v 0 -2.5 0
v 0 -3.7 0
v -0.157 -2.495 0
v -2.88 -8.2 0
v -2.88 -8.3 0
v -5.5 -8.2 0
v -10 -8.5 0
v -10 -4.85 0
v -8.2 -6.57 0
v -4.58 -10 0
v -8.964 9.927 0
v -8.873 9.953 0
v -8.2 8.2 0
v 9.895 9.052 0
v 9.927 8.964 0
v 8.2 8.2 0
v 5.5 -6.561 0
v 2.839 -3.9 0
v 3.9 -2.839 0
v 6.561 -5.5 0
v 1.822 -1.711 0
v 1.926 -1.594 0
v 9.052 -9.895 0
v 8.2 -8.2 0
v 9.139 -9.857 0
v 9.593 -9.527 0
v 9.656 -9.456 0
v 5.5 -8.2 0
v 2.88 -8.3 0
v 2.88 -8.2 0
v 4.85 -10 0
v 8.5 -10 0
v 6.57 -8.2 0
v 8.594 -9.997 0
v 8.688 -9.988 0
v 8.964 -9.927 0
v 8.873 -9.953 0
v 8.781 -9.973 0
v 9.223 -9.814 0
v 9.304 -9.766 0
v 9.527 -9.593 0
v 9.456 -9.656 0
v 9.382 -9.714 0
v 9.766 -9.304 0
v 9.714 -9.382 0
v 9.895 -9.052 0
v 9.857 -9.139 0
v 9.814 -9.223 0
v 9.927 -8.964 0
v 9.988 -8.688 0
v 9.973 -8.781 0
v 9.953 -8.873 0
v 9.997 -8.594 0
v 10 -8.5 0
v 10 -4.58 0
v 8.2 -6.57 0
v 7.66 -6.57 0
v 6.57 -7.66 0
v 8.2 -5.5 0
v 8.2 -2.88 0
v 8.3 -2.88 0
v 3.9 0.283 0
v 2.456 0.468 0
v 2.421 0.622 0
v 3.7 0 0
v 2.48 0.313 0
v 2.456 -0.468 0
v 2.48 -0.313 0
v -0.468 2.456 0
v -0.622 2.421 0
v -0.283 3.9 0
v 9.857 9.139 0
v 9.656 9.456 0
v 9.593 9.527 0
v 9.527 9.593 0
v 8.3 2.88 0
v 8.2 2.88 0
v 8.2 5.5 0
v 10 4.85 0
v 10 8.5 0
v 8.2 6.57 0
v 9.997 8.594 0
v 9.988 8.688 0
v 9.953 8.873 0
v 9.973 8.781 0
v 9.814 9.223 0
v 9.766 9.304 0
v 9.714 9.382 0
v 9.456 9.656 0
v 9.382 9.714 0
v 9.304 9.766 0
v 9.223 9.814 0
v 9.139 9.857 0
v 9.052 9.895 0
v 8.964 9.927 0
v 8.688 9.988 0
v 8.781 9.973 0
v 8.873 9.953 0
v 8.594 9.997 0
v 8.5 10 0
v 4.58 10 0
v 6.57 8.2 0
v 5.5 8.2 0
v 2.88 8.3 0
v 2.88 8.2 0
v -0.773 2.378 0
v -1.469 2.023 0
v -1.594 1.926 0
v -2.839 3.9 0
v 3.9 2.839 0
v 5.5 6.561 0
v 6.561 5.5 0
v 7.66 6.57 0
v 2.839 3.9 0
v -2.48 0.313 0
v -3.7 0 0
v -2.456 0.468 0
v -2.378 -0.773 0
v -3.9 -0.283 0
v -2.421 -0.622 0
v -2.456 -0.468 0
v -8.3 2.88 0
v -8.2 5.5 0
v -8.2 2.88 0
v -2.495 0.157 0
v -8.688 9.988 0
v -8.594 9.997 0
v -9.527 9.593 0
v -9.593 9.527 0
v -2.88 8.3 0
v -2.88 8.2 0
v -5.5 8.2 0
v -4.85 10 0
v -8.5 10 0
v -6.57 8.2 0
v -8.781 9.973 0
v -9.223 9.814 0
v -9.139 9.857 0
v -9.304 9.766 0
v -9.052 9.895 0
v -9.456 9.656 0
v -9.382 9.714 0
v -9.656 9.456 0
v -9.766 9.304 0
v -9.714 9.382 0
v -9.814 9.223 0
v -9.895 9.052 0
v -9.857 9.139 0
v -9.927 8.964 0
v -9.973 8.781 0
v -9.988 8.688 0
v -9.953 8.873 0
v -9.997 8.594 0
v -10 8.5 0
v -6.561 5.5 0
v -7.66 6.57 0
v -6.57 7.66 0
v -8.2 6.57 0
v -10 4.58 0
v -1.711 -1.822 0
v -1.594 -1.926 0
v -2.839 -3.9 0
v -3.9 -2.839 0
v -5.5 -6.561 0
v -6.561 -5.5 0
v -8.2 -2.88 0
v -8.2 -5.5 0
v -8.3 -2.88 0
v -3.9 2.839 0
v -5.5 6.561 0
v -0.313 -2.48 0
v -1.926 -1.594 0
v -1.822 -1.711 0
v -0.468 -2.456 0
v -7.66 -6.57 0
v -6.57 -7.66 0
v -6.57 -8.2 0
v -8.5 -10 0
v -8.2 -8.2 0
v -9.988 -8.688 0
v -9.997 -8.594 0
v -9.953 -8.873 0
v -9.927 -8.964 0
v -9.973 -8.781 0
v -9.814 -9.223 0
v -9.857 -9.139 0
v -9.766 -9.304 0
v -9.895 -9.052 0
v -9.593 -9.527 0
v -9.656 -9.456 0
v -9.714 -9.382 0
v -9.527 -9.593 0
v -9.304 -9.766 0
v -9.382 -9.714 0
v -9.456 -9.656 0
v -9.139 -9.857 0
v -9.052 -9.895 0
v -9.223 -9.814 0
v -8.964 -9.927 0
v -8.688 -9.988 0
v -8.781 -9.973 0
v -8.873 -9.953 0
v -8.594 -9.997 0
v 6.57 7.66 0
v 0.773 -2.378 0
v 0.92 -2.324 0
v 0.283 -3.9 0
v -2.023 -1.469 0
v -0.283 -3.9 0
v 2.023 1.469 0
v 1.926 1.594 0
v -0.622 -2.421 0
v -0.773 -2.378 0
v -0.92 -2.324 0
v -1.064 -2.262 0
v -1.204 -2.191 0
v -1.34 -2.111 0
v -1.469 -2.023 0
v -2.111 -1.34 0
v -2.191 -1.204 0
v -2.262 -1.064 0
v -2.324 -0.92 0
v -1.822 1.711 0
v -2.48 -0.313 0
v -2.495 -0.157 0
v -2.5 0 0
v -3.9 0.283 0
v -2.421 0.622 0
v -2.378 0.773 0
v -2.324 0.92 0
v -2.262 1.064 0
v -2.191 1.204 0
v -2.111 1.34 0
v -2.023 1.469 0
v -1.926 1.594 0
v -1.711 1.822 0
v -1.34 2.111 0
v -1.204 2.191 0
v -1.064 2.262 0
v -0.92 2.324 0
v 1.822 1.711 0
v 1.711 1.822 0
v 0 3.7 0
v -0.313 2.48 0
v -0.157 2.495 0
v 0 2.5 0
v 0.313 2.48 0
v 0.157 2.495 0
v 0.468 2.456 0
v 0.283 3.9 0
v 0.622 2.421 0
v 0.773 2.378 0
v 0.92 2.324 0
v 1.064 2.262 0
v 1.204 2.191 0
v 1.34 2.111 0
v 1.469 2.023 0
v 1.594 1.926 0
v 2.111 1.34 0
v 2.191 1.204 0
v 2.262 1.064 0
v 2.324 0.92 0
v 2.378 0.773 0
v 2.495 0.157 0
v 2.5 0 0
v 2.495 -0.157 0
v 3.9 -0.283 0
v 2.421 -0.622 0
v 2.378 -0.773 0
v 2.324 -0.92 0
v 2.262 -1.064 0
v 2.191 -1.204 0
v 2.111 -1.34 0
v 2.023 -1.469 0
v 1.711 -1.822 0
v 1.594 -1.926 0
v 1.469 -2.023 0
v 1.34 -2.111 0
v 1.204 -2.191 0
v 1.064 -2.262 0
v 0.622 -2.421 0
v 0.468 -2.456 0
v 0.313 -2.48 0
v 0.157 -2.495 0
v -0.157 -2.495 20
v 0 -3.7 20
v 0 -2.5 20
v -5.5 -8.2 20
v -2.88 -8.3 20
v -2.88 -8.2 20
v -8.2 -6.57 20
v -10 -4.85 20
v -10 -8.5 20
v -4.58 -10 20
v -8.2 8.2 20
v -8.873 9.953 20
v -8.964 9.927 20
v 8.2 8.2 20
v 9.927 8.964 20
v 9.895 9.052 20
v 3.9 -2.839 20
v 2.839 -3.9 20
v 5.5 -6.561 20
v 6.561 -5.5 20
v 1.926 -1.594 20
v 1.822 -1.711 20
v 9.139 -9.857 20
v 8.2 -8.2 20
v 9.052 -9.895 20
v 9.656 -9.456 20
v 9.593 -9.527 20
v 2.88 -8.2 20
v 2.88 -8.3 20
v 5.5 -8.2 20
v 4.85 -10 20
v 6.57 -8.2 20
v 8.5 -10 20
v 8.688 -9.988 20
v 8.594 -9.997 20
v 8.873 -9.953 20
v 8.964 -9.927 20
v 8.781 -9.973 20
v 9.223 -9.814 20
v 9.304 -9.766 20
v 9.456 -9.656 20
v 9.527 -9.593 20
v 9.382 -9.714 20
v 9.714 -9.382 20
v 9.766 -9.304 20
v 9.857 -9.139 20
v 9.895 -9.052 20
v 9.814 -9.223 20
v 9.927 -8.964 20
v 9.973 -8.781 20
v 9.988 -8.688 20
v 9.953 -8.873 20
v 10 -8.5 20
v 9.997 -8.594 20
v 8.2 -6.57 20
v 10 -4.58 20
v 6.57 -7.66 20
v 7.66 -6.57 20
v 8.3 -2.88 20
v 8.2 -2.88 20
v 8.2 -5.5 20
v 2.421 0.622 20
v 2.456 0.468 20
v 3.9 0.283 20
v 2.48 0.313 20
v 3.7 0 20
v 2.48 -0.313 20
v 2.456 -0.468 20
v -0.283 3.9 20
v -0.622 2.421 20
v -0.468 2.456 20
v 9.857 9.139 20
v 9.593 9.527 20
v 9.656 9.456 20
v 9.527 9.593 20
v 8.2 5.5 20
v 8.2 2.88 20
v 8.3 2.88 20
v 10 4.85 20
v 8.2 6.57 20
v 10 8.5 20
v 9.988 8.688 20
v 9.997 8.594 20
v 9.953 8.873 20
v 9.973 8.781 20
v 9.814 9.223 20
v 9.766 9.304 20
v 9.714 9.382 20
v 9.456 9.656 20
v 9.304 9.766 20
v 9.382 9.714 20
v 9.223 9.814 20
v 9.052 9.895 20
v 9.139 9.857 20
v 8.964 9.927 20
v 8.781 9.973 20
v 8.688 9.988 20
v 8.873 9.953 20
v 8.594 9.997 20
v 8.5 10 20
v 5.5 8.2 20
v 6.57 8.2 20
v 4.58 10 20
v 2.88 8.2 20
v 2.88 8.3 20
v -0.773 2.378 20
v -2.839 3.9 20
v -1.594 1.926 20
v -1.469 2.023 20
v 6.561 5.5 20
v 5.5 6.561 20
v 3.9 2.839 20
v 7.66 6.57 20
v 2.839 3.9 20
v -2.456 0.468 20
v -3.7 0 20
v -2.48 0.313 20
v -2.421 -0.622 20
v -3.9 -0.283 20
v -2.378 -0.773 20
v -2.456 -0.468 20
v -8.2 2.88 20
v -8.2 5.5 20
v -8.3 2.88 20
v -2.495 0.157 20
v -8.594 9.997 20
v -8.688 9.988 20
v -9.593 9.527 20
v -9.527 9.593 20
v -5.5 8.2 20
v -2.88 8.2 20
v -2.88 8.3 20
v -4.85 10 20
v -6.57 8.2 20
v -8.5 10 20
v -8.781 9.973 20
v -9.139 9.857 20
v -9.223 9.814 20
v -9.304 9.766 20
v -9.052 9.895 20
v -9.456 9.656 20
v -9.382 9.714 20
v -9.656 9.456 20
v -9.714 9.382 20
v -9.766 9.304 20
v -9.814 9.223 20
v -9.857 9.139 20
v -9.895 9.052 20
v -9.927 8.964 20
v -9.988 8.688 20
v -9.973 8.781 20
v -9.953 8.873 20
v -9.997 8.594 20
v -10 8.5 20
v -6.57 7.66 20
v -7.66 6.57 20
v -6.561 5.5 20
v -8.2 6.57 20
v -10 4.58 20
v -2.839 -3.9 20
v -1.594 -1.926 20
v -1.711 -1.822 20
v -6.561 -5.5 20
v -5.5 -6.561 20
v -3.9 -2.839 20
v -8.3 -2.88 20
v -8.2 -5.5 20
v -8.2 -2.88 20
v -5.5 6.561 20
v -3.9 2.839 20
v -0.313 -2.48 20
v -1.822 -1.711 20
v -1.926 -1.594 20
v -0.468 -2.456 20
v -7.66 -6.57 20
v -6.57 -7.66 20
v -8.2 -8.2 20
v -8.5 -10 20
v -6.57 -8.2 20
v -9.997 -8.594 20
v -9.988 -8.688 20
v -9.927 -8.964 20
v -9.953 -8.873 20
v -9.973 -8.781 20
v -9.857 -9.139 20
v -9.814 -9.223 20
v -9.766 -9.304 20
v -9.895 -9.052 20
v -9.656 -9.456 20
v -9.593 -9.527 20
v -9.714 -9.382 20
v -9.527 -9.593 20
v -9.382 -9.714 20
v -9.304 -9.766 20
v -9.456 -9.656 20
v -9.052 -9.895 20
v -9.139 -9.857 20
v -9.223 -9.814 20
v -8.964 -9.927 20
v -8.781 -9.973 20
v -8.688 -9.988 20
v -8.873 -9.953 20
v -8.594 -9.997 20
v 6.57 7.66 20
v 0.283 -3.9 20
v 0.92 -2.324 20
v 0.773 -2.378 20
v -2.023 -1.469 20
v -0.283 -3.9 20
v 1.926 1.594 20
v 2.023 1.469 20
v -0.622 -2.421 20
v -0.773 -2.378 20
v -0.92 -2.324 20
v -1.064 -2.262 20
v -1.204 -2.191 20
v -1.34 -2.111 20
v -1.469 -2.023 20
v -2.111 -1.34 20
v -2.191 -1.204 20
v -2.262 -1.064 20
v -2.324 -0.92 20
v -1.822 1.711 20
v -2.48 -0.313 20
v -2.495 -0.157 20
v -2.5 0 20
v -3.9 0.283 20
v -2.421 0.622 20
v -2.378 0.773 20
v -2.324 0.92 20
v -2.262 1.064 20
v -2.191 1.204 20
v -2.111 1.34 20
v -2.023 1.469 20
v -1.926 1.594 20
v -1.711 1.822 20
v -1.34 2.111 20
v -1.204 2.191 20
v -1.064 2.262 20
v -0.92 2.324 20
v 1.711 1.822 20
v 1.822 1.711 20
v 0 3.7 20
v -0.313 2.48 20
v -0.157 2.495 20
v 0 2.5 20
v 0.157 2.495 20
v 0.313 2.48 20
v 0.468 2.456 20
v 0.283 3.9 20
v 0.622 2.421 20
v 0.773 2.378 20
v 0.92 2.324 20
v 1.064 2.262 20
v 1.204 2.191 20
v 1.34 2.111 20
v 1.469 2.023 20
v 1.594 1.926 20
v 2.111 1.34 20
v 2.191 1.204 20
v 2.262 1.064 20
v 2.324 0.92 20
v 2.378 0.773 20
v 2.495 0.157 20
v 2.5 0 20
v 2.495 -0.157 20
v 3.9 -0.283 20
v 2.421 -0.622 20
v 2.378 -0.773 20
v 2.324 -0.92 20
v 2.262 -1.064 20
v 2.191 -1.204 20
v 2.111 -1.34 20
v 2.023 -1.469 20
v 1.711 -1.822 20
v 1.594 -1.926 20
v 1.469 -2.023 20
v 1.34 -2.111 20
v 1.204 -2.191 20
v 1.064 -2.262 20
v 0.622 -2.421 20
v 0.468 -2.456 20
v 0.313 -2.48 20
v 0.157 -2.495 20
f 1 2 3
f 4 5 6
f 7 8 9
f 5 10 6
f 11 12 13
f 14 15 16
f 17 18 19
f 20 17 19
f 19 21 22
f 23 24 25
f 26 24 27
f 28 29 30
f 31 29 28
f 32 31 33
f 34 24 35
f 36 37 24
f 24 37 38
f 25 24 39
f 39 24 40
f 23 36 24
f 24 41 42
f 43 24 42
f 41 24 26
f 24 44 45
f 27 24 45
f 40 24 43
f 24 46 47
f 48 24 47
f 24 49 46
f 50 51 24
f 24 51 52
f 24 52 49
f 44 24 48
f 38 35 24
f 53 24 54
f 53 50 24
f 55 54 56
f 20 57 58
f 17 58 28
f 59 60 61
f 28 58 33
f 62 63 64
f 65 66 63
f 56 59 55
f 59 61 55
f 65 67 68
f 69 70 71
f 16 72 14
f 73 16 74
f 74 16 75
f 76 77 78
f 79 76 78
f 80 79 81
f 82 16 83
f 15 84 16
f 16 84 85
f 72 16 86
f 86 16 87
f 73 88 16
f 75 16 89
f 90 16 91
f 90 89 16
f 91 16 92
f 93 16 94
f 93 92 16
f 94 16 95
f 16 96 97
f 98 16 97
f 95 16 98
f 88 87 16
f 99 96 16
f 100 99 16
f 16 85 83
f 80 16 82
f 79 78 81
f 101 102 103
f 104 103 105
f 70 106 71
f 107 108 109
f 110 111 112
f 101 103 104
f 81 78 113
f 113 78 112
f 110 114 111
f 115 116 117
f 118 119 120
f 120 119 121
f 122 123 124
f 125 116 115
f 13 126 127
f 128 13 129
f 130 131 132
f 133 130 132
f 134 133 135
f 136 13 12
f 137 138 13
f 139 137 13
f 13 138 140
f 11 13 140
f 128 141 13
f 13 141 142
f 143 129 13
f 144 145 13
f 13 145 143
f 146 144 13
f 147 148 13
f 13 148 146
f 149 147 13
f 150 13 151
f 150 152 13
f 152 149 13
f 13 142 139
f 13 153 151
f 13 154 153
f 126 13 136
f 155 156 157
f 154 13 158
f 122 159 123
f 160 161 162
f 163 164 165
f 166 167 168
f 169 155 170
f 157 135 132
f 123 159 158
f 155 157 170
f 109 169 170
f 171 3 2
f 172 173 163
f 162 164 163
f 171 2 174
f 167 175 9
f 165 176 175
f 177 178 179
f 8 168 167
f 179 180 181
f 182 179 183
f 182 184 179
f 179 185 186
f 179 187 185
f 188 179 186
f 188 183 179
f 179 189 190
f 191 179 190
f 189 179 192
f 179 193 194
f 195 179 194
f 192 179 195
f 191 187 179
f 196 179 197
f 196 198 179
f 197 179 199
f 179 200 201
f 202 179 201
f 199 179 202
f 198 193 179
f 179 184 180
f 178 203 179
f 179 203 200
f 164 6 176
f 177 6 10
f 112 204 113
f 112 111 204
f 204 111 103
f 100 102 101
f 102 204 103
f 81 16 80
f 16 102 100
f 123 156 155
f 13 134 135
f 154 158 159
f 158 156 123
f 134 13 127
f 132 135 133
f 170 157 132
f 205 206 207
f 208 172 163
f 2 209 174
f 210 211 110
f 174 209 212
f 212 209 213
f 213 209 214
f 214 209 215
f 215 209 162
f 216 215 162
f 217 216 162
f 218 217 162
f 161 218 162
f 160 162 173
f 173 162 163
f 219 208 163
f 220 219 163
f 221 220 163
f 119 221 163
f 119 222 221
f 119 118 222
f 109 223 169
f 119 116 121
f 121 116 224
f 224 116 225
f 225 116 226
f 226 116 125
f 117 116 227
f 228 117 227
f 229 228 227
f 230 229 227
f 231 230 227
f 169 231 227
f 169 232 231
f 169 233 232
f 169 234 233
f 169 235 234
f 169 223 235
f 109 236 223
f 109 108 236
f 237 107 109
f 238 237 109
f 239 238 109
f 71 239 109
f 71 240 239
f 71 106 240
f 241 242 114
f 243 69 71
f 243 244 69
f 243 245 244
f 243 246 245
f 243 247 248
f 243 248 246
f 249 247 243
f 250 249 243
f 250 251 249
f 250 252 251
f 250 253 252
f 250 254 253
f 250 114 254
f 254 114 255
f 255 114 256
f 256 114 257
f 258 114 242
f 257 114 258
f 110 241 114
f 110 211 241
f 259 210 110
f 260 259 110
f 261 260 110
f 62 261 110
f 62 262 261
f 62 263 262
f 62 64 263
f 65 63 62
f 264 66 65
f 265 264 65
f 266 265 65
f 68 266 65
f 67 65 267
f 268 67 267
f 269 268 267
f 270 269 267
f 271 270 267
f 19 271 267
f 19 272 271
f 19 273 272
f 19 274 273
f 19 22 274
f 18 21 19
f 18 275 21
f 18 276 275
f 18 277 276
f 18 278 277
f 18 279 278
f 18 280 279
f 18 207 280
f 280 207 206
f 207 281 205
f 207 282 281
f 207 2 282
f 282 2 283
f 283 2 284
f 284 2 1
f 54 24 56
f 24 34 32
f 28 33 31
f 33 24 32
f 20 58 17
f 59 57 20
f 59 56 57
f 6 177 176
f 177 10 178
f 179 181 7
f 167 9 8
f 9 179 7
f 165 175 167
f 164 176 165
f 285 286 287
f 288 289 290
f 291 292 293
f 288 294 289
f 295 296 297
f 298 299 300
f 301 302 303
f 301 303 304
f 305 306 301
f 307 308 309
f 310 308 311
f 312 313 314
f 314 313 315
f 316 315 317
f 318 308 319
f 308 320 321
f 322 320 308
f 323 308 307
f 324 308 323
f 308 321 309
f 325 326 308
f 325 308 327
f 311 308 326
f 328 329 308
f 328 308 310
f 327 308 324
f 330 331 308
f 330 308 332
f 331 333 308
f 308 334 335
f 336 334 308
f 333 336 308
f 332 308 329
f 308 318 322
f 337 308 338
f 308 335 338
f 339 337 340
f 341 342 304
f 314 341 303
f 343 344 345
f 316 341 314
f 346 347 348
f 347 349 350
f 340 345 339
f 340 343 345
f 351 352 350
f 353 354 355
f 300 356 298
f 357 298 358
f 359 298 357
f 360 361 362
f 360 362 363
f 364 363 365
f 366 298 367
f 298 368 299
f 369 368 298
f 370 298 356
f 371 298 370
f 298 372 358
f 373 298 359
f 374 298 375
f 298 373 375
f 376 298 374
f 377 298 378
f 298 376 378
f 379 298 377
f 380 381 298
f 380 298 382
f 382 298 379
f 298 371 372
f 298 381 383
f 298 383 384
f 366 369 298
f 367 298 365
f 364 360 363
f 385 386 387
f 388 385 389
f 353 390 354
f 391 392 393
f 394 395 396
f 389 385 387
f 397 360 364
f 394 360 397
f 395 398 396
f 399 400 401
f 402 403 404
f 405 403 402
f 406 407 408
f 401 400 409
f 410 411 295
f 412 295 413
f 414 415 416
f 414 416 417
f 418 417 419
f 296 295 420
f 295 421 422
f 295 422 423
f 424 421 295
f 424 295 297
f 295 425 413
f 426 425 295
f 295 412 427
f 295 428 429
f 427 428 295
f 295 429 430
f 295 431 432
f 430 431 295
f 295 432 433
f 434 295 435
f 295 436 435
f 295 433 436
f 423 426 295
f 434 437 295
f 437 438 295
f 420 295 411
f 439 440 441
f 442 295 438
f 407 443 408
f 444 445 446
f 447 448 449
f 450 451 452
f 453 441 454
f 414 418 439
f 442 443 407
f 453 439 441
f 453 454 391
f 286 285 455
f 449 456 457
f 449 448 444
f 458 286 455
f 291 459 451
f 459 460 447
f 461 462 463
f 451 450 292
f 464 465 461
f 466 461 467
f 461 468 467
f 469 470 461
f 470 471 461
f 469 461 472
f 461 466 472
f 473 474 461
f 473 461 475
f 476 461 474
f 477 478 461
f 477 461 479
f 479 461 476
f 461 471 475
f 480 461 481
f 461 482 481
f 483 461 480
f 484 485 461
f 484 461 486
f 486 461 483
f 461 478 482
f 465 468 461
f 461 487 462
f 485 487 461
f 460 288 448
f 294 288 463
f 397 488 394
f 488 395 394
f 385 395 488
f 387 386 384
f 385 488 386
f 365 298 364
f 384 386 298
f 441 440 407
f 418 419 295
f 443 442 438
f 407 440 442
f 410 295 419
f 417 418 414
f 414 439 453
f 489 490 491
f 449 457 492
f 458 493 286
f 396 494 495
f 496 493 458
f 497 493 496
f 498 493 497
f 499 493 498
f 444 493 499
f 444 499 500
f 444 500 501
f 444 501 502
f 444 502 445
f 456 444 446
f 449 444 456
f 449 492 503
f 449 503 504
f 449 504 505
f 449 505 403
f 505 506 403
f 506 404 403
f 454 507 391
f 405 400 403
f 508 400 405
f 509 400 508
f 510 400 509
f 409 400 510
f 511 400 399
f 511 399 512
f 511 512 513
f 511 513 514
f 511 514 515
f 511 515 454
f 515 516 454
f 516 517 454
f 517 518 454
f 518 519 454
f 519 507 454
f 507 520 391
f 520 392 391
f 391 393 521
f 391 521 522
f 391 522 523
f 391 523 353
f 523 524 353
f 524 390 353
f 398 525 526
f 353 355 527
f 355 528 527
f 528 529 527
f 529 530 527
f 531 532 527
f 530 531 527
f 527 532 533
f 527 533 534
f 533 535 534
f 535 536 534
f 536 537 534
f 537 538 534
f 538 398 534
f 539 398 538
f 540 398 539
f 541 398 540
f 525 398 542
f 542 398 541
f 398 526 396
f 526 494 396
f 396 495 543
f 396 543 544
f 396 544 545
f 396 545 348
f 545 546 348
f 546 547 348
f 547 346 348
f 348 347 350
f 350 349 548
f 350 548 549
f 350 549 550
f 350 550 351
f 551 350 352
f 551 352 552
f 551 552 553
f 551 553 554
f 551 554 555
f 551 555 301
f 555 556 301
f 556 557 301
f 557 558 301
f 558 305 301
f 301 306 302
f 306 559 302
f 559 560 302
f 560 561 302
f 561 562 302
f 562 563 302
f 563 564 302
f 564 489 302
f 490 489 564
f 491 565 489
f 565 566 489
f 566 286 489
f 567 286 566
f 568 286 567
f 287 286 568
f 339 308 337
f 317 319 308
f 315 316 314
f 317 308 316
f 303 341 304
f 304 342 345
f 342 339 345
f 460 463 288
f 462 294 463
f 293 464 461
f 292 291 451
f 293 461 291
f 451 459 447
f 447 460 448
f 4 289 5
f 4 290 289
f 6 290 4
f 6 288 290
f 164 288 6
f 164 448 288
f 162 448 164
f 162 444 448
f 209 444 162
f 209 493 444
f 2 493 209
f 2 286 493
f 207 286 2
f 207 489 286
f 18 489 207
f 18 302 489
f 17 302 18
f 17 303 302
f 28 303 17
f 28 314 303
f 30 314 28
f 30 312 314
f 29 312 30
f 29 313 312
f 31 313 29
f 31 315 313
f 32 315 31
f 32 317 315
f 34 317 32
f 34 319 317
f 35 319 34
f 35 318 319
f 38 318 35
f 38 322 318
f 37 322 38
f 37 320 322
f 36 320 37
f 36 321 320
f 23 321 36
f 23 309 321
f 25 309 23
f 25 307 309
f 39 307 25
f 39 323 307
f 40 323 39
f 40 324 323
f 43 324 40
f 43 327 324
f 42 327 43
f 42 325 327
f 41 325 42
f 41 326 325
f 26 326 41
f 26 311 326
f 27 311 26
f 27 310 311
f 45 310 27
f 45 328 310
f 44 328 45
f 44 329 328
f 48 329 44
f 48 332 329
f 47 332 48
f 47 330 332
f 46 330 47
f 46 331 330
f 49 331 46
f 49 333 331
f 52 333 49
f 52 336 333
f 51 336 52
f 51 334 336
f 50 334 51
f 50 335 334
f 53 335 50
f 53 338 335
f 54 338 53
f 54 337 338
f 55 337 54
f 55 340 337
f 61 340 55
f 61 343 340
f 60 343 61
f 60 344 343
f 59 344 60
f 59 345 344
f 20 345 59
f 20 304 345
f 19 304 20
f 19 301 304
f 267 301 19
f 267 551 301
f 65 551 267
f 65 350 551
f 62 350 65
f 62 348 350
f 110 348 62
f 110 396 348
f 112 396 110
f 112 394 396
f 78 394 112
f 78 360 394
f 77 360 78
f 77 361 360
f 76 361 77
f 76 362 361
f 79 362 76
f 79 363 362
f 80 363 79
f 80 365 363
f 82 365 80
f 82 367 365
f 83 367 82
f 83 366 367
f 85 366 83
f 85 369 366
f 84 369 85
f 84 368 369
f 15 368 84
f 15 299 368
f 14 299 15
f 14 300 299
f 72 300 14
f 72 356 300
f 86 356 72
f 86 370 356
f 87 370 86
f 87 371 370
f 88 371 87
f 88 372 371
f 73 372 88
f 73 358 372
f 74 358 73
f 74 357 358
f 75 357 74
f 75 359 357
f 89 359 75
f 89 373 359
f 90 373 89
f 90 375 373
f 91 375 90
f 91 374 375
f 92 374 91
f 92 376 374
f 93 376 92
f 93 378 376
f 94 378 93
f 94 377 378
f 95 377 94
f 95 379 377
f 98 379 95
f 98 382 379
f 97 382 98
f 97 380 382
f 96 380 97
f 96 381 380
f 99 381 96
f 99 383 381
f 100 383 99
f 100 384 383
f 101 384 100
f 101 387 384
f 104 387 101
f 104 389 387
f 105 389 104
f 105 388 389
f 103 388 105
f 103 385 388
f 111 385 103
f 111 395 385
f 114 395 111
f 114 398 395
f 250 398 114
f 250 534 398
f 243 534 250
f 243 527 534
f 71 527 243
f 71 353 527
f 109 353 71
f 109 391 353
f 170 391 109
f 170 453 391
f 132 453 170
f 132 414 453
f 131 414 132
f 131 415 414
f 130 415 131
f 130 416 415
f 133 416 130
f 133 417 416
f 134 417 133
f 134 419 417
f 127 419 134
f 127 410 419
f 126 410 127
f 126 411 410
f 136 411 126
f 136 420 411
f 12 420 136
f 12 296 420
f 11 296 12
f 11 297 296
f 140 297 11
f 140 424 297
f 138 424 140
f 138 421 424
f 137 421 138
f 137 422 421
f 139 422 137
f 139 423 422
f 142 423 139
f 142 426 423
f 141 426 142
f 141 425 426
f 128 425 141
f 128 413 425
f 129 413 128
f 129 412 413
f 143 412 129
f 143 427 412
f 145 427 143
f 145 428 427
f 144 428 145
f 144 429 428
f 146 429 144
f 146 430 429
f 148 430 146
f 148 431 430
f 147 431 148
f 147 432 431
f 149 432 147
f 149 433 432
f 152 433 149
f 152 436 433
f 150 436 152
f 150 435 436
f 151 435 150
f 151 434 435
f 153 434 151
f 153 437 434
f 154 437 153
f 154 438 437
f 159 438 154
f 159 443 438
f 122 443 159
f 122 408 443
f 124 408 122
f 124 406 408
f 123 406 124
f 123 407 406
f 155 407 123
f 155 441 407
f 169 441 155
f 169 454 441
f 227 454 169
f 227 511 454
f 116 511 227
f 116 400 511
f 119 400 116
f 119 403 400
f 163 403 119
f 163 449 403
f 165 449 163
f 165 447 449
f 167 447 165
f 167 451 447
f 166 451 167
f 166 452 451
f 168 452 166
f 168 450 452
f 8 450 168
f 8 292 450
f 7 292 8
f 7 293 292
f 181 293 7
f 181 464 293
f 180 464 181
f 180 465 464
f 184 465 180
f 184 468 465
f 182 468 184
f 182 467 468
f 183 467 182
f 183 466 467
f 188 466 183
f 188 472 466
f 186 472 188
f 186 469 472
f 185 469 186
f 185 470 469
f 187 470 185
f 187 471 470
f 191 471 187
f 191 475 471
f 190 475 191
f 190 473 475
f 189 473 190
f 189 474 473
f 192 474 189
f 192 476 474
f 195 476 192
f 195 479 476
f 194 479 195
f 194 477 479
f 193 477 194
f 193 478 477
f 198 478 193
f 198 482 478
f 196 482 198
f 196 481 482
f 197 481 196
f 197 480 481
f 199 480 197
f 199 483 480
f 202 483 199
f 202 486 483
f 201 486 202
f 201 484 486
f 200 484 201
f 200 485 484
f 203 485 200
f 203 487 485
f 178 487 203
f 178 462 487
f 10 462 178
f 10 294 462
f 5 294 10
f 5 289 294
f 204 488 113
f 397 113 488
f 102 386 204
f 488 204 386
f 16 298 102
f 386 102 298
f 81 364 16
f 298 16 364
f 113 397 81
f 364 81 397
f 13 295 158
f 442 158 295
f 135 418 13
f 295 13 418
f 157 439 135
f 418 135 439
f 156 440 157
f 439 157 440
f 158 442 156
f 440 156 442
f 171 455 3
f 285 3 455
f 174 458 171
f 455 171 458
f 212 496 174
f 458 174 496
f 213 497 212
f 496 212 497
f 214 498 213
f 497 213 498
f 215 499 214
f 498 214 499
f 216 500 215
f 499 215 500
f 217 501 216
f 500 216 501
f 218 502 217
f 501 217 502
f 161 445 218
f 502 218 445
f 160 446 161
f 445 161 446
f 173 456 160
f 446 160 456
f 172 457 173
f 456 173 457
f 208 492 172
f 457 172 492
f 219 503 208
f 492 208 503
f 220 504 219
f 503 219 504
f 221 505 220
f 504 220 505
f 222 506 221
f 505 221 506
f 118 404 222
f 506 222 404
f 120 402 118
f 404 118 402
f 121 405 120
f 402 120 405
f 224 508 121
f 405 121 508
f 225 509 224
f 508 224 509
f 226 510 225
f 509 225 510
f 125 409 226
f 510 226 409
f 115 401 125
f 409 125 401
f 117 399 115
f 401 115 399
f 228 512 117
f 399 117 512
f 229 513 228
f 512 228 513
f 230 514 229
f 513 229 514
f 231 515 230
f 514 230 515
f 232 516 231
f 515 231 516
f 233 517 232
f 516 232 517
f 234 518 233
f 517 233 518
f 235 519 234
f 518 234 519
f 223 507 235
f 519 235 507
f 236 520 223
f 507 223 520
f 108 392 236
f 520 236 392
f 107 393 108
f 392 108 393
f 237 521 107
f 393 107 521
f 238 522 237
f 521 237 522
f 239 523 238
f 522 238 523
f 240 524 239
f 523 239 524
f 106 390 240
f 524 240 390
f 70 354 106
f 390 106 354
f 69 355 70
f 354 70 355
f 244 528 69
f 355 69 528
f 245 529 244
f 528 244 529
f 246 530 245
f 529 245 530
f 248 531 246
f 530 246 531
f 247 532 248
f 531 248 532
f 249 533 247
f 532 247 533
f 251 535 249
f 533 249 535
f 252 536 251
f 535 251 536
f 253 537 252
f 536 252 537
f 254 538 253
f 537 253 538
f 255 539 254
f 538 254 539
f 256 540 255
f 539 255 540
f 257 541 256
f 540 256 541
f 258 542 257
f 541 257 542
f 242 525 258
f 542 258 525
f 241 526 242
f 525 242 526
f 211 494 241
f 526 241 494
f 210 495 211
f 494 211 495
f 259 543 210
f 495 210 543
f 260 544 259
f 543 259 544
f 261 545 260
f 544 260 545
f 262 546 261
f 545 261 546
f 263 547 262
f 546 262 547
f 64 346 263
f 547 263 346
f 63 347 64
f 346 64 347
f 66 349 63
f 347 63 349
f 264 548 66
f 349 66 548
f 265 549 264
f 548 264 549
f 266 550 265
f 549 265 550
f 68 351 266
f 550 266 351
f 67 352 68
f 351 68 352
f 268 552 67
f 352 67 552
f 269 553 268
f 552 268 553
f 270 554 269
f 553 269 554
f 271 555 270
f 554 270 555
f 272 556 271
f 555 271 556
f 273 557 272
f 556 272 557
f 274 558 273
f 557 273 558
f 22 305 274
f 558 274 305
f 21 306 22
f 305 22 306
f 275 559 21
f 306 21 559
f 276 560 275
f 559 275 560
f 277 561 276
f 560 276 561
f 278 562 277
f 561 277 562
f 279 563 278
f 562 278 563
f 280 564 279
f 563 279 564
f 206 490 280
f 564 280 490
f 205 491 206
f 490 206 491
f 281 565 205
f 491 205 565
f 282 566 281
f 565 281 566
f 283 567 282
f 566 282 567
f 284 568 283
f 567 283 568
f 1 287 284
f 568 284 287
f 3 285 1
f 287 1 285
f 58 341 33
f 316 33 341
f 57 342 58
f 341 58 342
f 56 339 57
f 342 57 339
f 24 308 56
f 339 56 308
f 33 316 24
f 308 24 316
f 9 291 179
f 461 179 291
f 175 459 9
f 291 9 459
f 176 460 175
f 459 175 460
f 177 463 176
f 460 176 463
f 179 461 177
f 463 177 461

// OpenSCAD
part = "20x Extrusion"; //[20x Extrusion, 40x40 Extrusion, Wheel, OpenRail, 20mm Gantry Plate, Universal Gantry Plate, OpenRail Gantry Plate, 20x End Cap, T-Nut, Flat Linker, Angled Linker] 

type = "20mm"; //[20mm, 40mm, 60mm, 80mm]

scale_factor = 1; //[1:Full, 0.5:Half, 0.25:Quarter]

length = 20; //[10:1:100]

sections = 2; //[2:1:24]

angle = 90; //[10:1:180]

hole_offset = 0; //[0:1:100]

/*[Hidden]*/
$fn=100;
delta=0.01;
tolerance = 0.2;

//radius to edge
function apothem(s=20, n) = s/(2*tan(180/n));
//radius to corner
function circumradius(s=20, n) = s/(2*sin(180/n));
//polar to cartesian
function p2c_x(r,a) = r*cos(a);
function p2c_y(r,a) = r*sin(a);

module oval_hole(){
    translate([-length/2,-diameter/2,0])
    cube([length,diameter,height]);
    
    translate([length/2,0,0])
    cylinder(h=height, d=diameter);
    
    translate([-length/2,0,0])
    cylinder(h=height, d=diameter);    
}

//Basic outline of one quarter of extrusion
module vslot_unit(){
    difference(){
        union(){
            polygon(points=[[0,0],[0,3.7],[0.2*sqrt(2),3.9],[3.9-1.5*sqrt(0.5),3.9],[5.5,5.5+1.5*sqrt(0.5)],[5.5,8.2],[2.88,8.2],[2.88,8.3],[4.58,10],[8.5,10],[8.5,8.5],[10,8.5],[10,4.85],[8.3,2.88],[8.2,2.88],[8.2,5.5],[5.5+1.5*sqrt(0.5),5.5],[3.9,3.9-1.5*sqrt(0.5)],[3.9,0.2*sqrt(2)],[3.7,0]]);
            
            translate([8.5,8.5,0])
            circle(d=3);
        }
        
        union(){
            circle(d=5);
            
            polygon(points=[[6.57,8.2],[8.2,8.2],[8.2,6.57],[7.66,6.57],[6.57,7.66]]);
        }
    }
}

module vslot_corner(){
    difference(){
        union(){
            polygon(points=[[0,0],[0,3.7],[0.2*sqrt(2),3.9],[2.4,3.9],[3.9,2.4],[3.9,0.2*sqrt(2)],[3.7,0]]);
            
            translate([2.4,2.4,0])
            circle(d=3);
        }
        
        circle(d=5);
    }
}

//Basic outline used in the middle of anything larger than 20x20
module vslot_extension_unit(){
    difference(){
        union(){
            polygon(points=[[0,0],[0,3.7],[0.2*sqrt(2),3.9],[3.9-1.5*sqrt(0.5),3.9],[5.5,5.5+1.5*sqrt(0.5)],[5.5,8.2],[2.78,8.2],[4.58,10],[10,10],[10,8.2],[7.3,8.2],[7.3,7.3-1.5*sqrt(0.5)],[3.9,3.9-1.5*sqrt(0.5)],[3.9,0.2*sqrt(2)],[3.7,0]]);
        }
        
        union(){
            circle(d=5);
        }
    }
}

//Pieces together the extention units
module vslot_extension_part(){
    translate([-20,0,0])
    vslot_extension_unit();
    
    translate([-20,0,0])
    mirror([0,1,0])
    vslot_extension_unit();
    
    rotate([0,0,180])
    vslot_extension_unit();
    
    mirror([0,1,0])
    rotate([0,0,180])
    vslot_extension_unit();
}

//Pieces together the extrusion
module extrusion(sections, offset_r){
    linear_extrude(height=length)
    offset(r=offset_r)
    union(){
        for(i=[0:1])
            rotate([0,0,-i*90])
            vslot_unit();
        
        translate([-20*(sections),0,0])
        for(i=[2:3])
            rotate([0,0,-i*90])
            vslot_unit();
        
        if(type != "20mm")
            for(i=[0:sections-1])
                translate([-20*i,0,0])
                vslot_extension_part();
    }
}

module 40x40(){
    linear_extrude(height=length)
    union(){
        for(i=[0:3])
        rotate([0,0,i*90])
        translate([10,10,0])
        union(){
            vslot_unit();

            rotate([0,0,-90])
            vslot_extension_unit();

            rotate([0,180,0])
            vslot_extension_unit();

            rotate([0,0,180])
            vslot_corner();
        }
    }
}

module wheel(){
    rotate_extrude()
    //Wheel cross section
    polygon(points=[[6.94717,-0.5],[7.98715,-0.5],[7.98715,-4.816523],[8.28715,-5.116523],[9.774828,-5.116523],[11.945,-2.946351],[11.945,-2.44542],[10.049828,-0.275],[9.374828,-0.275],[9.374828,0.275],[10.049828,0.275],[11.945,2.44542],[11.945,2.946351],[9.774828,5.116523],[8.28715,5.116523],[7.98715,4.816523],[7.98715,0.5],[6.94717,0.5]]);
}

module openrail(){
    difference(){
        linear_extrude(height=length)
        union(){
            //OpenRail cross section
            polygon(points=[[0,0.3],[0.3,0.3],[0.3,0],[2.075,0],[2.075,0.3],[2.375,0.3],[2.375,19.529],[4.75,19.529],[4.75,20.329],[2.375+0.5*sqrt(0.5),22.704-0.5*sqrt(0.5)],[2.375,22.704-0.5*sqrt(2)],[2.375-0.5*sqrt(0.5),22.704-0.5*sqrt(0.5)],[0,20.329]]);
            
            translate([0.3,0.3,0])
            circle(d=0.6);
            
            translate([2.075,0.3,0])
            circle(d=0.6);
            
            translate([2.375,22.704-0.5*sqrt(2),0])
            circle(d=1);
        }
        
        for(i=[0:floor(length/50)])
            translate([-delta,9.7543,50*(i+0.5)])
            rotate([0,90,0])
            rotate([0,0,-90])
            oval_hole(length=6.7, diameter=5.3, height=2.375+2*delta);
    }
}

plate_spec = [
["width","Depth","Thickness","Corner Radius",
    ["Hole Diameter","Hole Length (0 for circle)","X translation","Y translation"]
],

//20mm Gantry Plate
[65.5,65.5,3,3.36,
    [3,6.5,-20.146,27.7],[3,6.5,0,27.7],[3,6.5,20.146,27.7],
    [5,0,-19.85,20],[5,20.64,0,20],[7.2,0,19.85,20],
    [5,0,-19.85,10],[5,0,0,10],[5,0,19.85,10],
    [5,0,-19.85,0],[5,0,-10,0],[5,0,0,0],[5,0,10,0],[7.2,0,19.85,0],
    [5,0,-19.85,-10],[5,0,0,-10],[5,0,19.85,-10],
    [5,0,-19.85,-20],[5,20.64,0,-20],[7.2,0,19.85,-20],
    [3,6.5,-20.146,-27.7],[3,6.5,0,-27.7],[3,6.5,20.146,-27.7]
],

//Universal Gantry Plate
[127,88,3,3.36,
    [3,6.5,-20,38.02],[3,6.5,0,38.02],[3,6.5,20,38.02],
    [5,0,-49.85,30.32],[5,0,-39.85,30.32],[5,0,-29.85,30.32],[5,0,-19.85,30.32],[5,20,0,30.32],[7.2,0,19.85,30.32],[7.2,0,29.85,30.32],[7.2,0,39.85,30.32],[7.2,0,49.85,30.32],
    [5,0,-49.85,20.325],[5,0,-39.85,20.325],[5,0,-29.85,20.325],[5,0,-19.85,20.325],[5,0,-10,20.325],[5,0,0,20.325],[5,0,10,20.325],[5,0,19.85,20.325],[5,0,29.85,20.325],[5,0,39.85,20.325],[5,0,49.85,20.325],
    [5,0,-14.825,14.82],[5,0,14.825,14.82],
    [5,0,-29.85,10],[5,0,-19.85,10],[5,0,0,10],[5,0,19.85,10],[5,0,29.85,10],
    [5,0,-49.85,0],[5,0,-39.85,0],[5,0,-29.85,0],[5,0,-19.85,0],[5,0,-10,0],[5,0,0,0],[5,0,10,0],[7.2,0,19.85,0],[7.2,0,29.85,0],[7.2,0,39.85,0],[7.2,0,49.85,0],
    [5,0,-29.85,-10],[5,0,-19.85,-10],[5,0,0,-10],[5,0,19.85,-10],[5,0,29.85,-10],
    [5,0,-14.825,-14.82],[5,0,14.825,-14.82],
    [5,0,-49.85,-20.325],[5,0,-39.85,-20.325],[5,0,-29.85,-20.325],[5,0,-19.85,-20.325],[5,0,-10,-20.325],[5,0,0,-20.325],[5,0,10,-20.325],[5,0,19.85,-20.325],[5,0,29.85,-20.325],[5,0,39.85,-20.325],[5,0,49.85,-20.325],
    [5,0,-49.85,-30.32],[5,0,-39.85,-30.32],[5,0,-29.85,-30.32],[5,0,-19.85,-30.32],[5,20,0,-30.32],[7.2,0,19.85,-30.32],[7.2,0,29.85,-30.32],[7.2,0,39.85,-30.32],[7.2,0,49.85,-30.32],
    [3,6.5,-20,-38.02],[3,6.5,0,-38.02],[3,6.5,20,-38.02]
],

//OpenRail 20mm Gantry Plate
[80,80,3.175,10,
    [5,0,-22.3,22.3],[5,0,0,22.3],[7.137,0,22.3,22.3],
    [5,0,0,22.30],
    [5,0,0,10],
    [5,0,-22.3,0],[5,0,-10,0],[5,0,0,0],[5,0,10,0],[7.137,0,22.3,0],
    [5,0,0,-10],
    [5,0,-22.3,-22.3],[5,0,0,-22.3],[7.137,0,22.3,-22.3]
],

//OpenRail 40mm Gantry Plate
[100,120,3.175,10,
    [5,0,-32.3,42.3],[5,0,-22.3,42.3],[5,0,-10,42.3],[5,0,0,42.3],[5,0,10,42.3],[7.137,0,22.3,42.3],[7.137,0,32.3,42.3],
    [5,0,-10,30],[5,0,10,30],
    [5,0,-10,20],[5,0,10,20],
    [5,0,-40,10],[5,0,-20,10],[5,0,0,10],[5,0,20,10],[5,0,40,10],
    [5,0,-32.3,0],[5,0,-10,0],[5,0,0,0],[5,0,10,0],[7.137,0,32.3,0],
    [5,0,-40,-10],[5,0,-20,-10],[5,0,0,-10],[5,0,20,-10],[5,0,40,-10],
    [5,0,-10,-20],[5,0,10,-20],
    [5,0,-10,-30],[5,0,10,-30],
    [5,0,-32.3,-42.3],[5,0,-22.3,-42.3],[5,0,-10,-42.3],[5,0,0,-42.3],[5,0,10,-42.3],[7.137,0,22.3,-42.3],[7.137,0,32.3,-42.3]
],

//OpenRail 60mm Gantry Plate
[120,140,3.175,10,
    [5,0,-42.3,52.3],[5,0,-32.3,52.3],[5,0,-22.3,52.3],[5,0,-10,52.3],[5,0,0,52.3],[5,0,10,52.3],[7.137,0,22.3,52.3],[7.137,0,32.3,52.3],[7.137,0,42.3,52.3],
    [5,0,-20,30],[5,0,0,30],[5,0,20,30],
    [5,0,-42.3,26.3],[7.137,0,42.3,26.3],
    [5,0,-30,20],[5,0,0,20],[5,0,30,20],
    [5,0,-45,10],[5,0,0,10],[5,0,45,10],
    [5,0,-42.30,0],[5,0,-30,0],[5,0,-20,0],[5,0,-10,0],[5,0,0,0],[5,0,10,0],[5,0,20,0],[5,0,30,0],[7.137,0,42.30,0],
    [5,0,-45,-10],[5,0,0,-10],[5,0,45,-10],
    [5,0,-30,-20],[5,0,0,-20],[5,0,30,-20],
    [5,0,-42.3,-26.3],[7.137,0,42.3,-26.3],
    [5,0,-20,-30],[5,0,0,-30],[5,0,20,-30],
    [5,0,-42.3,-52.3],[5,0,-32.3,-52.3],[5,0,-22.3,-52.3],[5,0,-10,-52.3],[5,0,0,-52.3],[5,0,10,-52.3],[7.137,0,22.3,-52.3],[7.137,0,32.3,-52.3],[7.137,0,42.3,-52.3]
],

//OpenRail 80mm Gantry Plate
[140,160,3.175,10,
    [5,0,-52.3,62.3],[5,0,-42.3,62.3],[5,0,-32.3,62.3],[5,0,-22.3,62.3],[5,0,-10,62.3],[5,0,0,62.3],[5,0,10,62.3],[7.137,0,22.3,62.3],[7.137,0,32.3,62.3],[7.137,0,42.3,62.3],[7.137,0,52.3,62.3],
    [5,0,-30,40],[5,0,-20,40],[5,0,20,40],[5,0,30,40],
    [5,0,-52.3,35],[7.137,0,52.3,35],
    [5,0,-40,30],[5,0,0,30],[5,0,40,30],
    [5,0,-55,10],[5,0,-40,10],[5,0,0,10],[5,0,40,10],[5,0,55,10],
    [5,0,-52.3,0],[5,0,-30,0],[5,0,-10,0],[5,0,0,0],[5,0,10,0],[5,0,30,0],[5,0,52.3,0],
    [5,0,-55,-10],[5,0,-40,-10],[5,0,0,-10],[5,0,40,-10],[5,0,55,-10],
    [5,0,-40,-30],[5,0,0,-30],[5,0,40,-30],
    [5,0,-52.3,-35],[7.137,0,52.3,-35],
    [5,0,-30,-40],[5,0,-20,-40],[5,0,20,-40],[5,0,30,-40],
    [5,0,-52.3,-62.3],[5,0,-42.3,-62.3],[5,0,-32.3,-62.3],[5,0,-22.3,-62.3],[5,0,-10,-62.3],[5,0,0,-62.3],[5,0,10,-62.3],[7.137,0,22.3,-62.3],[7.137,0,32.3,-62.3],[7.137,0,42.3,-62.3],[7.137,0,52.3,-62.3]
]
];

module plate (plate_type){
    difference(){
        //The plate
        translate([-(plate_spec[plate_type][0]-plate_spec[plate_type][3])/2,-(plate_spec[plate_type][1]-plate_spec[plate_type][3])/2,0])
        minkowski(){
            cube([plate_spec[plate_type][0]-plate_spec[plate_type][3],plate_spec[plate_type][1]-plate_spec[plate_type][3],plate_spec[plate_type][2]/2]);
            cylinder(h=plate_spec[plate_type][2]/2, d=plate_spec[plate_type][3]);
        }
        
        //The holes
        for (i=[4:len(plate_spec[plate_type])-1]){
            translate([plate_spec[plate_type][i][2],plate_spec[plate_type][i][3],-delta])
            oval_hole(height=plate_spec[plate_type][2]+2*delta,diameter=plate_spec[plate_type][i][0],length=plate_spec[plate_type][i][1]);
        }
    }
}

module end_cap(sections, offset_r){
    difference(){
        translate([-8.5-20*sections,-8.5,-2])
        minkowski(){
            cube([17+20*sections,17,6]);
            cylinder(h=6, d=3);
        }
        
        union(){
            extrusion(sections, offset_r);
            
            for(i=[-1:2:1])
                translate([8.2,8.2*i,0])
                cylinder(h=15, d=3.4);
            
            for(i=[-1:2:1])
                translate([-8.2-20*sections,8.2*i,0])
                cylinder(h=15, d=3.4);
        }
    }
}

module t_nut(){
    difference(){
        linear_extrude(height=length)
        //2.5*tolerance allows T-Nut to move freely, reduce ratio for tighter fit
        offset(r=-2.5*tolerance)
        polygon(points=[[3.9-1.5*sqrt(0.5),3.9],[5.5,5.5+1.5*sqrt(0.5)],[5.5,8.2],[-5.5,8.2],[-5.5,5.5+1.5*sqrt(0.5)],[-3.9+1.5*sqrt(0.5),3.9]]);
        
        translate([0,3.9+tolerance-delta,length/2])
        rotate([0,30,0])
        rotate([-90,0,0])
        union(){
            // h = depth of nut hole
            // (d*sqrt(3)/2 = nut size, flat-to-flat
            cylinder(h=2.5, d=(2*5.5)/sqrt(3), $fn=6);
            
            // d = diameter of hole for bolt thread
            cylinder(h=4.3-2*tolerance+2*delta, d=2.5);
        }
    }
}

module linker_blank(){
    translate([0,0,-3.9-2.5*tolerance])
    rotate([90,0,0])
    difference(){
        linear_extrude(height=length)
        //2.5*tolerance allows T-Nut to move freely, reduce ratio for tighter fit
        offset(r=-2.5*tolerance)
        polygon(points=[[3.9-1.5*sqrt(0.5),3.9],[5.5,5.5+1.5*sqrt(0.5)],[5.5,8.2],[-5.5,8.2],[-5.5,5.5+1.5*sqrt(0.5)],[-3.9+1.5*sqrt(0.5),3.9]]);
        
        for(i=[-floor(length/20):2:floor(length/20)])
        translate([0,3.9+tolerance-delta,5*i+length/2])
        rotate([0,30,0])
        rotate([-90,0,0])
        union(){
            // h = depth of nut hole
            // (d*sqrt(3)/2 = nut size, flat-to-flat
            cylinder(h=2.5, d=(2*5.5)/sqrt(3), $fn=6);
            
            // d = diameter of hole for bolt thread
            cylinder(h=4.3-2*tolerance+2*delta, d=2.5);
        }
    }
}

module flat_linker(){
    //total angle
    a=(sections-1)*angle;
    //interior of half triangle
    b=90-a/2;
    //y from origin
    B=apothem(s=20,n=360/angle);
    //x from origin
    A=(B*sin(a/2))/sin(b);
    //cord
    cord=2*circumradius(s=20,n=360/angle);

    difference(){
        union(){
            for(i=[0:sections-1])
            rotate([0,0,i*angle])
            translate([0,-apothem(n=360/angle),0])
            linker_blank();

            rotate(-angle/2)
            linear_extrude(height=4.3-(5*tolerance))
            rotate([180,0,0])
            polygon(points=
            [for (i = [0 : sections]) 
            [circumradius(n=360/angle)*sin(i*angle),
            circumradius(n=360/angle)*cos(i*angle)]
            ]);

            intersection(){
                translate([A,-apothem(s=20,n=360/angle),0])
                cylinder(r=A+10, h=4.3-(5*tolerance));

                translate([-10,-B,0])
                rotate(a/2)
                cube([cord,cord,4.3-(5*tolerance)]);
            }
        }
        union(){            
            rotate([0,0,a/2-90])
            translate([hole_offset,0,-delta])
            cylinder(d=2.5, h=4.3-(5*tolerance)+2*delta);
        }
    }
}

module angled_linker(){
    translate([0,0,-4.3+(5*tolerance)+2*delta])
    linker_blank();

    rotate([180-angle,0,0])
    translate([0,length,-4.3+(5*tolerance)+2*delta])
    linker_blank();

    translate([-5.5+(2.5*tolerance),0,0])
    rotate([0,90,0])
    rotate_extrude(angle=180-angle)
    translate([8.6-(4.5*tolerance),5.5-(2.5*tolerance),0])
    rotate([0,0,90])
    offset(r=-2.5*tolerance)
    polygon(points=[[3.9-1.5*sqrt(0.5),3.9],[5.5,5.5+1.5*sqrt(0.5)],[5.5,8.2],[-5.5,8.2],[-5.5,5.5+1.5*sqrt(0.5)],[-3.9+1.5*sqrt(0.5),3.9]]);
}

module show_what(){
    if(part == "20x Extrusion"){
        if(type == "20mm")
            extrusion(sections=0, offset_r=0);
        if(type == "40mm")
            extrusion(sections=1, offset_r=0);
        if(type == "60mm")
            extrusion(sections=2, offset_r=0);
        if(type == "80mm")
            extrusion(sections=3, offset_r=0);
    }
    if(part == "40x40 Extrusion")
        40x40();
    if(part == "Wheel")
        wheel();
    if(part == "OpenRail")
        openrail();
    if(part == "20mm Gantry Plate")
        plate(plate_type=1);
    if(part == "Universal Gantry Plate")
        plate(plate_type=2);
    if(part == "OpenRail Gantry Plate"){
        if(type == "20mm")
            plate(plate_type=3);
        if(type == "40mm")
            plate(plate_type=4);
        if(type == "60mm")
            plate(plate_type=5);
        if(type == "80mm")
            plate(plate_type=6);
    }
    if(part == "20x End Cap"){
        if(type == "20mm")
            end_cap(sections=0, offset_r=tolerance);
        if(type == "40mm")
            end_cap(sections=1, offset_r=tolerance);
        if(type == "60mm")
            end_cap(sections=2, offset_r=tolerance);
        if(type == "80mm")
            end_cap(sections=3, offset_r=tolerance);
    }
    if(part == "T-Nut")
        t_nut();
    if (part == "Flat Linker")
        flat_linker();
    if (part == "Angled Linker")
        angled_linker();
}

color("silver")
scale(scale_factor)
show_what();
